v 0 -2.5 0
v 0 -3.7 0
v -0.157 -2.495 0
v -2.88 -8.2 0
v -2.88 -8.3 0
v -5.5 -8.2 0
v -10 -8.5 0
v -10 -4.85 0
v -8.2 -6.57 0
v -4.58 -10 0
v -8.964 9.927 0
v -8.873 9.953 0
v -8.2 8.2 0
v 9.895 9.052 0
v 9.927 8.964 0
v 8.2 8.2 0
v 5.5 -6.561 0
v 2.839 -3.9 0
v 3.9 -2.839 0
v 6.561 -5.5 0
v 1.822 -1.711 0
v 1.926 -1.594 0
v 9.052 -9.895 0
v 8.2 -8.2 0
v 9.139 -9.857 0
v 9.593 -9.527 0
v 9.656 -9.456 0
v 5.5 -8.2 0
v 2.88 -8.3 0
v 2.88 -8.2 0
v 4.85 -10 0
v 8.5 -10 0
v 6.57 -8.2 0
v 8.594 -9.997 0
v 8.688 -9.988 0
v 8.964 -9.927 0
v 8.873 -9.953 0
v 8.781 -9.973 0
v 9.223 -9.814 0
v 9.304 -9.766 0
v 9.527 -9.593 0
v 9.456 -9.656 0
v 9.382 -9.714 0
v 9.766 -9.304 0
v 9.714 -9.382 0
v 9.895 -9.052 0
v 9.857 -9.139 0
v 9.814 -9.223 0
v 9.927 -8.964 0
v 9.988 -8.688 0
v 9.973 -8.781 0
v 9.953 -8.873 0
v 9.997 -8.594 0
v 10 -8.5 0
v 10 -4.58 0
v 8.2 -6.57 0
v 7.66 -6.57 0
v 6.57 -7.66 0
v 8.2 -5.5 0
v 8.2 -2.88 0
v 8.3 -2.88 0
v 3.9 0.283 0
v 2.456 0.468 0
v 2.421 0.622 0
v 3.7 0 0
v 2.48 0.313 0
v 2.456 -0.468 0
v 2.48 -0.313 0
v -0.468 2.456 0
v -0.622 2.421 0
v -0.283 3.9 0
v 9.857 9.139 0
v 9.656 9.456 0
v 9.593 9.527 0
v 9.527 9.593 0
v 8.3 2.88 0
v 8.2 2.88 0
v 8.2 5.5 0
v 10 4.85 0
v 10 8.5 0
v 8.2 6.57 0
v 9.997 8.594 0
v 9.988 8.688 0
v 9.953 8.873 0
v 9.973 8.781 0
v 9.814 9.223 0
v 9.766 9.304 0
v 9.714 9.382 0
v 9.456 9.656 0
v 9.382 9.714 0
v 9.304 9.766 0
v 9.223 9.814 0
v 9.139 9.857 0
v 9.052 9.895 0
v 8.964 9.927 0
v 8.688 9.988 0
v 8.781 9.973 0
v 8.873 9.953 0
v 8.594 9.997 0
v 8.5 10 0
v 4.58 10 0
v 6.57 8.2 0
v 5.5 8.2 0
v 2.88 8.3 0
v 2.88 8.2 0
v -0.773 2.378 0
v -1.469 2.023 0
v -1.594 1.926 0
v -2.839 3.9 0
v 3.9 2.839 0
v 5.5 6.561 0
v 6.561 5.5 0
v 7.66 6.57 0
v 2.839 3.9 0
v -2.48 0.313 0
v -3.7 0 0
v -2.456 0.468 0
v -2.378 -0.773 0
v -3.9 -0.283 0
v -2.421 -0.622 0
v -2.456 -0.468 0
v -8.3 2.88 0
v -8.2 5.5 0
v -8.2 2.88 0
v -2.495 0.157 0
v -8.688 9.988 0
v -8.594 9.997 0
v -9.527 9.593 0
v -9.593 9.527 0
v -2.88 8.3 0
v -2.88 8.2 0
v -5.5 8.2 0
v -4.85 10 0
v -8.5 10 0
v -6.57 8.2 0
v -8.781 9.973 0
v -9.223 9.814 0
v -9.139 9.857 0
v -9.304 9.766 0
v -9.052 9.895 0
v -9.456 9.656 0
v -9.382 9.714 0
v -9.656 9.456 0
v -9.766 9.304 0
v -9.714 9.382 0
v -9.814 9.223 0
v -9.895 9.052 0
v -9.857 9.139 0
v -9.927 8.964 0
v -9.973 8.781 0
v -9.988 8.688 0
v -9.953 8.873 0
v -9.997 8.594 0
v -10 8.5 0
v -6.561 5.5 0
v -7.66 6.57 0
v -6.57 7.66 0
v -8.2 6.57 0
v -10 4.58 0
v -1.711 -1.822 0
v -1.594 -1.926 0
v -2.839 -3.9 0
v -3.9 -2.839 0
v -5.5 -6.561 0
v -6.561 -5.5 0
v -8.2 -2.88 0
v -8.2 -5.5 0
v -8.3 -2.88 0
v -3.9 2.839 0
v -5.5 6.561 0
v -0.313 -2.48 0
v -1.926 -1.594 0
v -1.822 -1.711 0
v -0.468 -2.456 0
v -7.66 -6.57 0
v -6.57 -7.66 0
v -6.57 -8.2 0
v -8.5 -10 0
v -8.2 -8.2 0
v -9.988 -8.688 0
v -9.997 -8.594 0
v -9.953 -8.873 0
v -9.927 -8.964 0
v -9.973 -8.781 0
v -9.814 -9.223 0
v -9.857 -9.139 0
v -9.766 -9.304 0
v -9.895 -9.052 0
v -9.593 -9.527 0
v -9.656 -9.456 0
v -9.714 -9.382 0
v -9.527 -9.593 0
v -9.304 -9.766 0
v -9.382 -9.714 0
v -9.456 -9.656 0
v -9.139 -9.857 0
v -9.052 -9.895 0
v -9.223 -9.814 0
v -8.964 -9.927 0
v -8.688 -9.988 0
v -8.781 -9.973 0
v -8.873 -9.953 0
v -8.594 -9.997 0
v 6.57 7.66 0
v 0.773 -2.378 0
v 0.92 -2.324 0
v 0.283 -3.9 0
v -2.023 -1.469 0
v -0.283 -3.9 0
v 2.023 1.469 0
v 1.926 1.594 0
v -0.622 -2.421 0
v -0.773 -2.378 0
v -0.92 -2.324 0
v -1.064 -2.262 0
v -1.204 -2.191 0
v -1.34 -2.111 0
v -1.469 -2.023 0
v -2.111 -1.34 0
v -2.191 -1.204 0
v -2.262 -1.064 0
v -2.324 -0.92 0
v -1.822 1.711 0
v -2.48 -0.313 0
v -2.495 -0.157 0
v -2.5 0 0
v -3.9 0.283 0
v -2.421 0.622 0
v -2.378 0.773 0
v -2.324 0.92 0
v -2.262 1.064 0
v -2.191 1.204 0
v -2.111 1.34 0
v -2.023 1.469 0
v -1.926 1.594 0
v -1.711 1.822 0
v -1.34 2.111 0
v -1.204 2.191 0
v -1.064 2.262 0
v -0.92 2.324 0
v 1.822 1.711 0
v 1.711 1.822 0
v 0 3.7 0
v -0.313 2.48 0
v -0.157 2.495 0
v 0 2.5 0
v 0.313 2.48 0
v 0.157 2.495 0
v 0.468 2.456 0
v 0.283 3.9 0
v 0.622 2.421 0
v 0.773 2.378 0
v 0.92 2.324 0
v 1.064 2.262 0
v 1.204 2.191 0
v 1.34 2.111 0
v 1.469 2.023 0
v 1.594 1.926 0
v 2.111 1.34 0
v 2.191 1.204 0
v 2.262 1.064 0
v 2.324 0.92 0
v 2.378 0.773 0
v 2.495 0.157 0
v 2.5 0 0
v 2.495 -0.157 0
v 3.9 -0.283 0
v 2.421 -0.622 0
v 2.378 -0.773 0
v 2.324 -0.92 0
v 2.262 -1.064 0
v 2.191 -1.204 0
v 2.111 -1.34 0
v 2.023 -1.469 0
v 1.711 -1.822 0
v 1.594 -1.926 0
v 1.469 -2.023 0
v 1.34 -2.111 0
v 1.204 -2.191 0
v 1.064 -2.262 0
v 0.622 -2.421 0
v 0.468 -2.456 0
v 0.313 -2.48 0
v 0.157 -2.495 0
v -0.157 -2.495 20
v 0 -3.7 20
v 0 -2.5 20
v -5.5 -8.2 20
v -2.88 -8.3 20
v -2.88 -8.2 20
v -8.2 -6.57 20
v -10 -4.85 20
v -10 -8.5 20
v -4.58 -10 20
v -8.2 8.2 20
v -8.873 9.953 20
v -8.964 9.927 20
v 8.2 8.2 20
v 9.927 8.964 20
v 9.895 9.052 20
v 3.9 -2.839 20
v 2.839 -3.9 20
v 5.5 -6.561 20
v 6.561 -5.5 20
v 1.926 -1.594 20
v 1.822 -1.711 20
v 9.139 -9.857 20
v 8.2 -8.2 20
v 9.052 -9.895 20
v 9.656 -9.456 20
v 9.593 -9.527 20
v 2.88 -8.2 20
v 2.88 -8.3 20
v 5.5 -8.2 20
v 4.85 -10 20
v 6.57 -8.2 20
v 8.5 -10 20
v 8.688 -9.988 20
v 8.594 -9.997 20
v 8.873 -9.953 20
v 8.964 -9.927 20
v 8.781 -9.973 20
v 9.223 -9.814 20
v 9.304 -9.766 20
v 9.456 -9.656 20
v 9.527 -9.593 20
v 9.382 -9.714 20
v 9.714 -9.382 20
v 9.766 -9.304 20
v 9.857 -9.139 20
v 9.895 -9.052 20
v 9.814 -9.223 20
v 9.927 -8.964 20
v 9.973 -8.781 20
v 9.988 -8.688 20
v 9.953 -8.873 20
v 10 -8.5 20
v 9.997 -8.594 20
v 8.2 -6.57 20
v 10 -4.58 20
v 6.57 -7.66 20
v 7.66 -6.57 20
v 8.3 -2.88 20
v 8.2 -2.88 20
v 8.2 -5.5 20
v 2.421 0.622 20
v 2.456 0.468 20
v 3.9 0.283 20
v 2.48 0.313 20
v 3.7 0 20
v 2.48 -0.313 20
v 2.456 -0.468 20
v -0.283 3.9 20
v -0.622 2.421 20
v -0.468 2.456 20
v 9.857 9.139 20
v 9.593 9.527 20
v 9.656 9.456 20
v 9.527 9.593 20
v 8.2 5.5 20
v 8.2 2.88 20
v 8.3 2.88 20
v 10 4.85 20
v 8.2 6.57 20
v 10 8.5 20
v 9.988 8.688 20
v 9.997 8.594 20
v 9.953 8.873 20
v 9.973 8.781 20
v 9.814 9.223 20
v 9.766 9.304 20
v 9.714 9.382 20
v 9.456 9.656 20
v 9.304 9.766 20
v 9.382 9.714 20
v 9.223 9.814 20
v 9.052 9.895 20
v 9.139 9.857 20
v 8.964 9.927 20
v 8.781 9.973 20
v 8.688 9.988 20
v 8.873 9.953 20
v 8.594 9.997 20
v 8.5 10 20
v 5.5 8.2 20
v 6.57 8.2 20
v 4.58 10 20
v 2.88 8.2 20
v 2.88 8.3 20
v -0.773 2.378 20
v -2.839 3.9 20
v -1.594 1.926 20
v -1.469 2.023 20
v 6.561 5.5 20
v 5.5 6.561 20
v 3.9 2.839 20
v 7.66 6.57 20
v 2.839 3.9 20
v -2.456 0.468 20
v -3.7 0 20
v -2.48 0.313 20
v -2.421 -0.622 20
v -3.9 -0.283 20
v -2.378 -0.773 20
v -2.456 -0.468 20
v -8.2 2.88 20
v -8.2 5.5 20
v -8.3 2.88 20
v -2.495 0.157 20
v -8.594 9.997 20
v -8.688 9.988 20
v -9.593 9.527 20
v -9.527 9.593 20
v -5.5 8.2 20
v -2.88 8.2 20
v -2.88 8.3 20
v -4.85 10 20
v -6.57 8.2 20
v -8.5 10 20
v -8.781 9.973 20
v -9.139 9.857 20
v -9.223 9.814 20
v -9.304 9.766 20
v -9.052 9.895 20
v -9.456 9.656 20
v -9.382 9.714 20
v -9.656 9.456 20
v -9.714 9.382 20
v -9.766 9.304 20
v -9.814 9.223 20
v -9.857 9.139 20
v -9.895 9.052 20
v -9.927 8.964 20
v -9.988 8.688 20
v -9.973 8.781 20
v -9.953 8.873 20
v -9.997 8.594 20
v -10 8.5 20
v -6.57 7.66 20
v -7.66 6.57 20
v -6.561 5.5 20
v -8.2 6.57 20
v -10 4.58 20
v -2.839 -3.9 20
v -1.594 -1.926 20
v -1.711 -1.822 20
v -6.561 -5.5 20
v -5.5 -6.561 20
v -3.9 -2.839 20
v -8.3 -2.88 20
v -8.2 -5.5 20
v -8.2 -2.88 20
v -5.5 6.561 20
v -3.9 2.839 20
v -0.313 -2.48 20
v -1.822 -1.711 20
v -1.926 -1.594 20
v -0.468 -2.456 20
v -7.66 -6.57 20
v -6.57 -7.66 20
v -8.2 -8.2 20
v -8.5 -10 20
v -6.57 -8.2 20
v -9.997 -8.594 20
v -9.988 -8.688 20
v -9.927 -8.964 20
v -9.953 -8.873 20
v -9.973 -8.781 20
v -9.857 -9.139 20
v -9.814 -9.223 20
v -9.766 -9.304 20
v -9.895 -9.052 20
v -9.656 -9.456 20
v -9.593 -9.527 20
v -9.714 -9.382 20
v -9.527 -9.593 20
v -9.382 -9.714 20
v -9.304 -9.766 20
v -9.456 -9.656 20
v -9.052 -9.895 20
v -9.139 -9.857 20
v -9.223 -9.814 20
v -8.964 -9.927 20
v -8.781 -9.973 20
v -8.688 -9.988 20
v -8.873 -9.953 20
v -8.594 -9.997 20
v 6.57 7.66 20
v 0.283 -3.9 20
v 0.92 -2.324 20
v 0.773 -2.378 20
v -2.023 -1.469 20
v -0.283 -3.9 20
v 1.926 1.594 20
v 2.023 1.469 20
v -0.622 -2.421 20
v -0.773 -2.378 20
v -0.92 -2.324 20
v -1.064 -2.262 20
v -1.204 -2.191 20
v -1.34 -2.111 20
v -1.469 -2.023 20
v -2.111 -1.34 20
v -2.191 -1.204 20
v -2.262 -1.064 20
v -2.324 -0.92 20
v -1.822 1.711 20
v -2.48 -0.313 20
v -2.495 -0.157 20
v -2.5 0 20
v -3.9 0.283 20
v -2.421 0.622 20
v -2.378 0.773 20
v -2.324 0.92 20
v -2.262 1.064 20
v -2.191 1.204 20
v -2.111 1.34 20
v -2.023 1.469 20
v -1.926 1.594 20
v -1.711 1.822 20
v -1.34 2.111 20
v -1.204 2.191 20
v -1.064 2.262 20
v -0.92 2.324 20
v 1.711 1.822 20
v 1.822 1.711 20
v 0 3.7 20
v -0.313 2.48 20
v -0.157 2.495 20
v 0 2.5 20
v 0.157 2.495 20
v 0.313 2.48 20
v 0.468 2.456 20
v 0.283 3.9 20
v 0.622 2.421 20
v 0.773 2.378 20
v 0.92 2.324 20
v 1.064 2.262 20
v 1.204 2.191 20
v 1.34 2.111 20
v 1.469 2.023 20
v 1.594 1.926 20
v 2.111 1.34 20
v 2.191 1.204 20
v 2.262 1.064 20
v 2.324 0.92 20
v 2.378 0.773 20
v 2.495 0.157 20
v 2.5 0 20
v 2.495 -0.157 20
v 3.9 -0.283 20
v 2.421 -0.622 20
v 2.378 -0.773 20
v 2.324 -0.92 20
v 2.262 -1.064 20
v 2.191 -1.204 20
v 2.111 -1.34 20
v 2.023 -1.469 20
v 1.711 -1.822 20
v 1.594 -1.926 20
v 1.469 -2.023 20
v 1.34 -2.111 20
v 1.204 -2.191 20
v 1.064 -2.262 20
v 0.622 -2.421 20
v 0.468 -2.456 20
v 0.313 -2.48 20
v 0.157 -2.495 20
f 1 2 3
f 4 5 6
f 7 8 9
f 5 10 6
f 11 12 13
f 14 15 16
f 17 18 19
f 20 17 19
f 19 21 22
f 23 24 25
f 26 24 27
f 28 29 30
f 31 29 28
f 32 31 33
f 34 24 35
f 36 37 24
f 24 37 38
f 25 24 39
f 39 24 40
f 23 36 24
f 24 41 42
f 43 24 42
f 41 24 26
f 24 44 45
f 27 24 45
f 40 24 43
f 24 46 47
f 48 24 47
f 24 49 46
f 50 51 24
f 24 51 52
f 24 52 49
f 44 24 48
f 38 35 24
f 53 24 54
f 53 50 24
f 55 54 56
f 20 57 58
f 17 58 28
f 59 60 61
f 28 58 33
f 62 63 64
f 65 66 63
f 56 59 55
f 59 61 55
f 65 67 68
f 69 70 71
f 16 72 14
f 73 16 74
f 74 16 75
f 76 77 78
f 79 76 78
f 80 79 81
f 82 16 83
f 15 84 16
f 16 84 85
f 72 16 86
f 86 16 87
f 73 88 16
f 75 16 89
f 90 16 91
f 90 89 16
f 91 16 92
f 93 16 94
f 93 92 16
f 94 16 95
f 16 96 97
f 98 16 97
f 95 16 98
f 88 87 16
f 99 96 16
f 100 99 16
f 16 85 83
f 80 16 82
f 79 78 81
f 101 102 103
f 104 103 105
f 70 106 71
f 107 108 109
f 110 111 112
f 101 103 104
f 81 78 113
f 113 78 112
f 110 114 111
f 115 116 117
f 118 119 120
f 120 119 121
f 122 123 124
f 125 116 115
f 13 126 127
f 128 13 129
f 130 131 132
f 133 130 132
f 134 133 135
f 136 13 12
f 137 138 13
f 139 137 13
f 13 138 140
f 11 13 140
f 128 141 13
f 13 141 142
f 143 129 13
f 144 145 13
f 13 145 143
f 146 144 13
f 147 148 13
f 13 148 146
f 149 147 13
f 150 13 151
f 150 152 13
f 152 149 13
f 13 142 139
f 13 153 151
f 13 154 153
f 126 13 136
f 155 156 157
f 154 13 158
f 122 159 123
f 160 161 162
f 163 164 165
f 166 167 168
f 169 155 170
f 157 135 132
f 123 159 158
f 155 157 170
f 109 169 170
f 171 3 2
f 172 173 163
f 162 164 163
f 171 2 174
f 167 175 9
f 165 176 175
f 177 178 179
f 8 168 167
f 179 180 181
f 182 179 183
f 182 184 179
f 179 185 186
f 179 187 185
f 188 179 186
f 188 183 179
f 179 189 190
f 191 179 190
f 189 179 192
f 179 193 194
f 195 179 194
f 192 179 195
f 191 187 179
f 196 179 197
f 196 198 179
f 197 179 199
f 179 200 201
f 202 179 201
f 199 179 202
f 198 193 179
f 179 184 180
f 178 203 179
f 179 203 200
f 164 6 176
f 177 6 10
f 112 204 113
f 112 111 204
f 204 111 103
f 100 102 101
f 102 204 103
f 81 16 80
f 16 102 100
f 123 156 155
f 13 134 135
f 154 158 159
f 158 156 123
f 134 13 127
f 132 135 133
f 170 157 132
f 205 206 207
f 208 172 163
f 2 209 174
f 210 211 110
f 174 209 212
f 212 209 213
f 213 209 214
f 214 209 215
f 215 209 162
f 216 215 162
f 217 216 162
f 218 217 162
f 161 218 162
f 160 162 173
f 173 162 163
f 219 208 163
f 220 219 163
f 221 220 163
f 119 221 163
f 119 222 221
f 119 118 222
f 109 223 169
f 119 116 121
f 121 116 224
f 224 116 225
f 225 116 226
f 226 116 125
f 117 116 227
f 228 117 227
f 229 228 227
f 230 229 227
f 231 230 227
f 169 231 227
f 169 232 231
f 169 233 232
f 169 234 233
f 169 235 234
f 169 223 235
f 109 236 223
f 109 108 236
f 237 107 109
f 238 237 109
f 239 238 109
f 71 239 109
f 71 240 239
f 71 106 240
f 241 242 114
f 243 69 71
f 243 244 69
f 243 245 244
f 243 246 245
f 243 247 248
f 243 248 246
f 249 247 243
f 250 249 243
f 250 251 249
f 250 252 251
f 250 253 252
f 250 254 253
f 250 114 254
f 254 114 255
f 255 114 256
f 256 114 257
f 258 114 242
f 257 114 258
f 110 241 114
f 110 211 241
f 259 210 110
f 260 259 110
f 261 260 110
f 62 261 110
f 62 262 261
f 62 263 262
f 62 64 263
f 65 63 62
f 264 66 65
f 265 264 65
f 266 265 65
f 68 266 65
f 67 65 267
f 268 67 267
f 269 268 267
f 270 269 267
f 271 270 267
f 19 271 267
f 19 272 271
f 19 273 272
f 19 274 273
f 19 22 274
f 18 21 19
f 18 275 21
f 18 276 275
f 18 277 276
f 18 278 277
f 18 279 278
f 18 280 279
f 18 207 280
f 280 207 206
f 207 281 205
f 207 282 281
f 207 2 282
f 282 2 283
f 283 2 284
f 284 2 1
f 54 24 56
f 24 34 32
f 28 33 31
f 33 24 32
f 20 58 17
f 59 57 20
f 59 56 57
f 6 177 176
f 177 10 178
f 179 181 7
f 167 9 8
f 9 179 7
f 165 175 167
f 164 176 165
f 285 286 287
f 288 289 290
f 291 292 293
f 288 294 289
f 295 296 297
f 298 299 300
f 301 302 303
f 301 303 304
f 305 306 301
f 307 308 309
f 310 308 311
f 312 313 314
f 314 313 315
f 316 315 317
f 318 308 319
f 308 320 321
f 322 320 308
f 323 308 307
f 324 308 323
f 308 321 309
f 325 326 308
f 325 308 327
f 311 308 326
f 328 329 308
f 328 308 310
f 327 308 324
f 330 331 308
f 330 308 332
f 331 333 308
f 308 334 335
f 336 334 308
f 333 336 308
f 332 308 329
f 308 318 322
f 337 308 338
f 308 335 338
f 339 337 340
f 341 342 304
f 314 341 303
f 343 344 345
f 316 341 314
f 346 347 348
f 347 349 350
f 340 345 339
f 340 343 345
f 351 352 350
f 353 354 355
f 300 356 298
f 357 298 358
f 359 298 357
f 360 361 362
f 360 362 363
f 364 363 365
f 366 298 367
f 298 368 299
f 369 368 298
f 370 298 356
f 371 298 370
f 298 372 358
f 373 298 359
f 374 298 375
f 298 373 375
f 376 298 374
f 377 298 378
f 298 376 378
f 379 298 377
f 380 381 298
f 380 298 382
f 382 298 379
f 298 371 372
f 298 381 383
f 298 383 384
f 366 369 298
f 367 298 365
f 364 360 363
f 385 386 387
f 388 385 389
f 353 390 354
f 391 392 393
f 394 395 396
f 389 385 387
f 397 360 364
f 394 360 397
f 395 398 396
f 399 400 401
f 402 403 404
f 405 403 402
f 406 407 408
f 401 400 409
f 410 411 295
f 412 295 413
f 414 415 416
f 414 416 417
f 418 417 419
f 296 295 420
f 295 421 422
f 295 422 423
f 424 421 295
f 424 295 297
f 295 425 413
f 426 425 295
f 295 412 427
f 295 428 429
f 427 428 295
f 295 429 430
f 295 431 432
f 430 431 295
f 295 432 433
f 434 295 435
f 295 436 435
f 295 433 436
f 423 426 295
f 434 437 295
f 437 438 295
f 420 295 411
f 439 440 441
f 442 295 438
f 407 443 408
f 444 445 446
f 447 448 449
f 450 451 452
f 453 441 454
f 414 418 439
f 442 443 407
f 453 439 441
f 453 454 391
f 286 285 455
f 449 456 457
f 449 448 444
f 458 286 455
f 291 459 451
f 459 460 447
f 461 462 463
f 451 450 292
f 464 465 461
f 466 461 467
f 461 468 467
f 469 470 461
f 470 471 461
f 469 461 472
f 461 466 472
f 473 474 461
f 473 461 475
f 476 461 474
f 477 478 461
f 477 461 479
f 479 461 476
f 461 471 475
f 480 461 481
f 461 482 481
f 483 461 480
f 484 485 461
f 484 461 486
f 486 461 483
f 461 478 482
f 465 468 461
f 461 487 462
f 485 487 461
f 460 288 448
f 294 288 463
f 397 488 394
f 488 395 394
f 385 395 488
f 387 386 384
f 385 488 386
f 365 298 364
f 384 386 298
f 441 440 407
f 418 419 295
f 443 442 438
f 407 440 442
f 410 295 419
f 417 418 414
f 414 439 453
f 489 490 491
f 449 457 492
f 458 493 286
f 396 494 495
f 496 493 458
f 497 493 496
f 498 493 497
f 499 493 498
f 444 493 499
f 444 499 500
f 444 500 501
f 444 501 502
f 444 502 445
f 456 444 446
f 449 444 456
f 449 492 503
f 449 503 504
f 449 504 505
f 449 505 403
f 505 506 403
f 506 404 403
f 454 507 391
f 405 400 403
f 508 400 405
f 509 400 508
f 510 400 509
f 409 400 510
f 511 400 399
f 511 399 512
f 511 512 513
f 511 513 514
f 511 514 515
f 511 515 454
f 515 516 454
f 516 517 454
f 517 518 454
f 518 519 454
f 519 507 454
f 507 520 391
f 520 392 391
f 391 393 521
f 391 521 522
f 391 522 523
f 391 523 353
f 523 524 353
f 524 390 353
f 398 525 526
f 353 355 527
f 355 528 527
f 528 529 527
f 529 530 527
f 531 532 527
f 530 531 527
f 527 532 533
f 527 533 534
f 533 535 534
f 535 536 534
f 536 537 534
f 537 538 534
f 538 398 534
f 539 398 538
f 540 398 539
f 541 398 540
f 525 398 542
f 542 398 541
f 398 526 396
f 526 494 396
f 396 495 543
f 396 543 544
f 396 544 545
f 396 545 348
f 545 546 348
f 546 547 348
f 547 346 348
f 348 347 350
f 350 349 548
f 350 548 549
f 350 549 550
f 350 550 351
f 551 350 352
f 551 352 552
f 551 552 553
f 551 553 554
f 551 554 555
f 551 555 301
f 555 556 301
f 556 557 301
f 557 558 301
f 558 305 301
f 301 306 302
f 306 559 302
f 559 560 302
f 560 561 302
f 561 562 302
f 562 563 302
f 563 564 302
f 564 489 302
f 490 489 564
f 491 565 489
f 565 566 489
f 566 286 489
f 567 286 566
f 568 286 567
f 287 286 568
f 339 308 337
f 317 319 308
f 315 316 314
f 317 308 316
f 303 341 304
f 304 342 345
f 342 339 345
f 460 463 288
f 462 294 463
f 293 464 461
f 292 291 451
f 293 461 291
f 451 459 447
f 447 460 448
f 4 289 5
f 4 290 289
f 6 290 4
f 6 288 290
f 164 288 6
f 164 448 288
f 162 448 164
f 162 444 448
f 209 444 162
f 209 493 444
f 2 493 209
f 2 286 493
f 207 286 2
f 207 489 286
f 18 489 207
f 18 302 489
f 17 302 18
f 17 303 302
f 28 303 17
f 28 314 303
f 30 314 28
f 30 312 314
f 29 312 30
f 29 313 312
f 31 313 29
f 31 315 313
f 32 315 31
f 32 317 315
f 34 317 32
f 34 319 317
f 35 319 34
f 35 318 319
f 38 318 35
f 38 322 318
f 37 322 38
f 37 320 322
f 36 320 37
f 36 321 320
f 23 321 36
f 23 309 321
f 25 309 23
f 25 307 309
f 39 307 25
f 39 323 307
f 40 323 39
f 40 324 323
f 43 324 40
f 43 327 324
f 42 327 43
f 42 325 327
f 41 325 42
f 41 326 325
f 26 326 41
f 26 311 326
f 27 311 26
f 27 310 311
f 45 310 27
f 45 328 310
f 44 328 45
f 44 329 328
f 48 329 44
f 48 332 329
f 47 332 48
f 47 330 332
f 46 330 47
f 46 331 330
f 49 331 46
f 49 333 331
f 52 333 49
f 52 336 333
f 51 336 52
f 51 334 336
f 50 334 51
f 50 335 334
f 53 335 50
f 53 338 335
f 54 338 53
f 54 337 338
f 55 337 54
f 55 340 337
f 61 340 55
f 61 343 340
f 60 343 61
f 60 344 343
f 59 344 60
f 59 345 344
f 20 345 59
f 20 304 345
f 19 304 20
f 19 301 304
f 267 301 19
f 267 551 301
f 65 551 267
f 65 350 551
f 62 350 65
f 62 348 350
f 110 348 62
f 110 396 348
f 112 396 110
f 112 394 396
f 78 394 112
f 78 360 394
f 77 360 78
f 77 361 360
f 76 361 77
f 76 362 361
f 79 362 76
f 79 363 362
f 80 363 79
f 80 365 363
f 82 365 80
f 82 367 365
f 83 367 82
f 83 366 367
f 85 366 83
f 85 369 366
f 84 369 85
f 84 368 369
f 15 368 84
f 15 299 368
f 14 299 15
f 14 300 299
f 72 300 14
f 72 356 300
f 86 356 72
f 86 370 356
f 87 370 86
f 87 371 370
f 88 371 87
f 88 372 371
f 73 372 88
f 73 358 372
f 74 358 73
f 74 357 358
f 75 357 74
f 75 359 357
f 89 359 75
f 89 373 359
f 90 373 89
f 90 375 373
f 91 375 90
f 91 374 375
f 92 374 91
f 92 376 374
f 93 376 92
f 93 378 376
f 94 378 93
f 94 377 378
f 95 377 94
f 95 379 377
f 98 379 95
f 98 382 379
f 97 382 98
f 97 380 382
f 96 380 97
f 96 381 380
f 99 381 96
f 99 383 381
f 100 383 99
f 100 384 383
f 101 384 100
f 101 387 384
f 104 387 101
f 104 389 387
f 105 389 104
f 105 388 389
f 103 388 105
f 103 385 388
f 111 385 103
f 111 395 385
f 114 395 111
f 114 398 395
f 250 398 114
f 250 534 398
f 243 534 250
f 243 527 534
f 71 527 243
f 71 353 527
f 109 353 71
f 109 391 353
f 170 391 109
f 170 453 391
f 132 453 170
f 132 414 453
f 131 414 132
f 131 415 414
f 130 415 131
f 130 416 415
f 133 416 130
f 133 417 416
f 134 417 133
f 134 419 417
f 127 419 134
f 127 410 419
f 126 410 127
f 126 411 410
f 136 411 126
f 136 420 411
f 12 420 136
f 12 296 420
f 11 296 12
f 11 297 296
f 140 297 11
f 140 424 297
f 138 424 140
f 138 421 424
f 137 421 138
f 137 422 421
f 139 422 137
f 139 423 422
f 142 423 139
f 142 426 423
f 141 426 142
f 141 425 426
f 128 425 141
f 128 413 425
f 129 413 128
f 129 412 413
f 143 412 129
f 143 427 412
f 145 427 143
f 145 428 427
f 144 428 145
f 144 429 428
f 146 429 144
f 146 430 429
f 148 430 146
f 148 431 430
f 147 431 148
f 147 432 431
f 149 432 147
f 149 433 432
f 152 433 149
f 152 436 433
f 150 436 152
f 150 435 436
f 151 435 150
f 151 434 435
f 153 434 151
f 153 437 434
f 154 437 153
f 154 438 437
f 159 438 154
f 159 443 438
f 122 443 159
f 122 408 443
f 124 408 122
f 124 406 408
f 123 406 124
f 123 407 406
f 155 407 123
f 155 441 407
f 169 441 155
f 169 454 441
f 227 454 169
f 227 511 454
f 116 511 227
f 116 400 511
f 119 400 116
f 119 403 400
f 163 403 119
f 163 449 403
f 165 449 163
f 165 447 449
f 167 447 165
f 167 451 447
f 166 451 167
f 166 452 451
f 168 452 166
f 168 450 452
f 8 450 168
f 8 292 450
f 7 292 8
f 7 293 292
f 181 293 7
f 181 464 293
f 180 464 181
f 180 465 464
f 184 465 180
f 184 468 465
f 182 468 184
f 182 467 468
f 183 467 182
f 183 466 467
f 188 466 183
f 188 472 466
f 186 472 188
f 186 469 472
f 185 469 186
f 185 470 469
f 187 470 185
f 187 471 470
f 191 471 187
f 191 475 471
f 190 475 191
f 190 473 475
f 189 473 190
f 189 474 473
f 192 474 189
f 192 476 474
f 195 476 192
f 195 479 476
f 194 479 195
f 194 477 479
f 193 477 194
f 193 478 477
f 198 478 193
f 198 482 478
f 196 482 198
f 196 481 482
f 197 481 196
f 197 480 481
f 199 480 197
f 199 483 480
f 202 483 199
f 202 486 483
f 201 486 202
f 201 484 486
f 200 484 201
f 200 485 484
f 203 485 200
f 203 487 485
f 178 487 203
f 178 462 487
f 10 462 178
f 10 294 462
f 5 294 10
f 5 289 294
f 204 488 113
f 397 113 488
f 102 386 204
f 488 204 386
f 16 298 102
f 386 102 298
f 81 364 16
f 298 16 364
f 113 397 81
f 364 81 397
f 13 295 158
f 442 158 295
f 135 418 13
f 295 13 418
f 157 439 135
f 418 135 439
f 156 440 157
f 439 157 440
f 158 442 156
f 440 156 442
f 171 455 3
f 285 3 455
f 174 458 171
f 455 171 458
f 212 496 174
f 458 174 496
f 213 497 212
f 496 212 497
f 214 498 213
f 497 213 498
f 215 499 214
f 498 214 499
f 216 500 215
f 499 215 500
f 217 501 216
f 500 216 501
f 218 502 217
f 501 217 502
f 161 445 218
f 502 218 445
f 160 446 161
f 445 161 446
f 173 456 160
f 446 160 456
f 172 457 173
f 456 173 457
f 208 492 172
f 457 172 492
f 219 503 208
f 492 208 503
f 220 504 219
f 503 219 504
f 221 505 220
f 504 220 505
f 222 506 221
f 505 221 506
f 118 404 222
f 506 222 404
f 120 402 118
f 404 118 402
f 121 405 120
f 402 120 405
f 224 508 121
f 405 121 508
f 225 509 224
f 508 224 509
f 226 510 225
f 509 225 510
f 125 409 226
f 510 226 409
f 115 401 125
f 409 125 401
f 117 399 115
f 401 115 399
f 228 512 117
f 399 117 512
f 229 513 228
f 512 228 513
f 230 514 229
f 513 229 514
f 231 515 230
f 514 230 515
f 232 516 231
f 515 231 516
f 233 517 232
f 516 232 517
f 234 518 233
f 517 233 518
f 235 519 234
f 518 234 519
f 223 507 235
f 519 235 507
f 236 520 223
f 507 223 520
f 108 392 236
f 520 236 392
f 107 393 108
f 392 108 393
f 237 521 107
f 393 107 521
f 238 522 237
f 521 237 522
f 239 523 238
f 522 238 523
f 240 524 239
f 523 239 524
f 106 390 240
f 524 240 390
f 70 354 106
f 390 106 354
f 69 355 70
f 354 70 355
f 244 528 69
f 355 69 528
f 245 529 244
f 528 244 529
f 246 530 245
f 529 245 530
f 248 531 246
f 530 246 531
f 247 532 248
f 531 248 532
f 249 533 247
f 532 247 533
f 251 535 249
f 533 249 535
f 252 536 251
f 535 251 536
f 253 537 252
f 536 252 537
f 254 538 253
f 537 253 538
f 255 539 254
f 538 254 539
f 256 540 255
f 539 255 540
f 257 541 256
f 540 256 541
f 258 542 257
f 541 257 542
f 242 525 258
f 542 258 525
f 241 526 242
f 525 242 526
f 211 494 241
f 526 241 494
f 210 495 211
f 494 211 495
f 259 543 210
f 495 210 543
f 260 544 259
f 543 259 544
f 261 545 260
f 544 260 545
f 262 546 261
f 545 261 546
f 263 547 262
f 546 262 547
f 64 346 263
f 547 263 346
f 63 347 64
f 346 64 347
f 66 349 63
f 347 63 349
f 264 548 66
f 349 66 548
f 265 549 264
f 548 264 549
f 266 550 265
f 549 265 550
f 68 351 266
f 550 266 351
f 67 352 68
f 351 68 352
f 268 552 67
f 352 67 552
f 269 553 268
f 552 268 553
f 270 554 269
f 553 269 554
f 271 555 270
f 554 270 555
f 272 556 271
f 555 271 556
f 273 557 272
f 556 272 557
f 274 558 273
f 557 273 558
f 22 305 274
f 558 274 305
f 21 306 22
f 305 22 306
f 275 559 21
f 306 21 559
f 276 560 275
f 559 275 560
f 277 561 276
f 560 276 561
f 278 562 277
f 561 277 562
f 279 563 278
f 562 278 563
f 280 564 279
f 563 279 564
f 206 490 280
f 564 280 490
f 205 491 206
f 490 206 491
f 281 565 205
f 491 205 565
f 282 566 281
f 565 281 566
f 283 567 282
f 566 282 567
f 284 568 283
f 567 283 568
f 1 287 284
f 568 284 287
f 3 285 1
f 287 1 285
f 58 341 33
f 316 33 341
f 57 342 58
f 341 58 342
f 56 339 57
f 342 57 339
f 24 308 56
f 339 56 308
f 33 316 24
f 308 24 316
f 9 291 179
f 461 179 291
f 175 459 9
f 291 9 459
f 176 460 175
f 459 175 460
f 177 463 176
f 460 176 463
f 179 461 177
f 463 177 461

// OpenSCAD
part = "20x Extrusion"; //[20x Extrusion, 40x40 Extrusion, Wheel, OpenRail, 20mm Gantry Plate, Universal Gantry Plate, OpenRail Gantry Plate, 20x End Cap, T-Nut, Flat Linker, Angled Linker] 

type = "20mm"; //[20mm, 40mm, 60mm, 80mm]

scale_factor = 1; //[1:Full, 0.5:Half, 0.25:Quarter]

length = 20; //[10:1:100]

sections = 2; //[2:1:24]

angle = 90; //[10:1:180]

hole_offset = 0; //[0:1:100]

/*[Hidden]*/
$fn=100;
delta=0.01;
tolerance = 0.2;

//radius to edge
function apothem(s=20, n) = s/(2*tan(180/n));
//radius to corner
function circumradius(s=20, n) = s/(2*sin(180/n));
//polar to cartesian
function p2c_x(r,a) = r*cos(a);
function p2c_y(r,a) = r*sin(a);

module oval_hole(){
    translate([-length/2,-diameter/2,0])
    cube([length,diameter,height]);
    
    translate([length/2,0,0])
    cylinder(h=height, d=diameter);
    
    translate([-length/2,0,0])
    cylinder(h=height, d=diameter);    
}

//Basic outline of one quarter of extrusion
module vslot_unit(){
    difference(){
        union(){
            polygon(points=[[0,0],[0,3.7],[0.2*sqrt(2),3.9],[3.9-1.5*sqrt(0.5),3.9],[5.5,5.5+1.5*sqrt(0.5)],[5.5,8.2],[2.88,8.2],[2.88,8.3],[4.58,10],[8.5,10],[8.5,8.5],[10,8.5],[10,4.85],[8.3,2.88],[8.2,2.88],[8.2,5.5],[5.5+1.5*sqrt(0.5),5.5],[3.9,3.9-1.5*sqrt(0.5)],[3.9,0.2*sqrt(2)],[3.7,0]]);
            
            translate([8.5,8.5,0])
            circle(d=3);
        }
        
        union(){
            circle(d=5);
            
            polygon(points=[[6.57,8.2],[8.2,8.2],[8.2,6.57],[7.66,6.57],[6.57,7.66]]);
        }
    }
}

module vslot_corner(){
    difference(){
        union(){
            polygon(points=[[0,0],[0,3.7],[0.2*sqrt(2),3.9],[2.4,3.9],[3.9,2.4],[3.9,0.2*sqrt(2)],[3.7,0]]);
            
            translate([2.4,2.4,0])
            circle(d=3);
        }
        
        circle(d=5);
    }
}

//Basic outline used in the middle of anything larger than 20x20
module vslot_extension_unit(){
    difference(){
        union(){
            polygon(points=[[0,0],[0,3.7],[0.2*sqrt(2),3.9],[3.9-1.5*sqrt(0.5),3.9],[5.5,5.5+1.5*sqrt(0.5)],[5.5,8.2],[2.78,8.2],[4.58,10],[10,10],[10,8.2],[7.3,8.2],[7.3,7.3-1.5*sqrt(0.5)],[3.9,3.9-1.5*sqrt(0.5)],[3.9,0.2*sqrt(2)],[3.7,0]]);
        }
        
        union(){
            circle(d=5);
        }
    }
}

//Pieces together the extention units
module vslot_extension_part(){
    translate([-20,0,0])
    vslot_extension_unit();
    
    translate([-20,0,0])
    mirror([0,1,0])
    vslot_extension_unit();
    
    rotate([0,0,180])
    vslot_extension_unit();
    
    mirror([0,1,0])
    rotate([0,0,180])
    vslot_extension_unit();
}

//Pieces together the extrusion
module extrusion(sections, offset_r){
    linear_extrude(height=length)
    offset(r=offset_r)
    union(){
        for(i=[0:1])
            rotate([0,0,-i*90])
            vslot_unit();
        
        translate([-20*(sections),0,0])
        for(i=[2:3])
            rotate([0,0,-i*90])
            vslot_unit();
        
        if(type != "20mm")
            for(i=[0:sections-1])
                translate([-20*i,0,0])
                vslot_extension_part();
    }
}

module 40x40(){
    linear_extrude(height=length)
    union(){
        for(i=[0:3])
        rotate([0,0,i*90])
        translate([10,10,0])
        union(){
            vslot_unit();

            rotate([0,0,-90])
            vslot_extension_unit();

            rotate([0,180,0])
            vslot_extension_unit();

            rotate([0,0,180])
            vslot_corner();
        }
    }
}

module wheel(){
    rotate_extrude()
    //Wheel cross section
    polygon(points=[[6.94717,-0.5],[7.98715,-0.5],[7.98715,-4.816523],[8.28715,-5.116523],[9.774828,-5.116523],[11.945,-2.946351],[11.945,-2.44542],[10.049828,-0.275],[9.374828,-0.275],[9.374828,0.275],[10.049828,0.275],[11.945,2.44542],[11.945,2.946351],[9.774828,5.116523],[8.28715,5.116523],[7.98715,4.816523],[7.98715,0.5],[6.94717,0.5]]);
}

module openrail(){
    difference(){
        linear_extrude(height=length)
        union(){
            //OpenRail cross section
            polygon(points=[[0,0.3],[0.3,0.3],[0.3,0],[2.075,0],[2.075,0.3],[2.375,0.3],[2.375,19.529],[4.75,19.529],[4.75,20.329],[2.375+0.5*sqrt(0.5),22.704-0.5*sqrt(0.5)],[2.375,22.704-0.5*sqrt(2)],[2.375-0.5*sqrt(0.5),22.704-0.5*sqrt(0.5)],[0,20.329]]);
            
            translate([0.3,0.3,0])
            circle(d=0.6);
            
            translate([2.075,0.3,0])
            circle(d=0.6);
            
            translate([2.375,22.704-0.5*sqrt(2),0])
            circle(d=1);
        }
        
        for(i=[0:floor(length/50)])
            translate([-delta,9.7543,50*(i+0.5)])
            rotate([0,90,0])
            rotate([0,0,-90])
            oval_hole(length=6.7, diameter=5.3, height=2.375+2*delta);
    }
}

plate_spec = [
["width","Depth","Thickness","Corner Radius",
    ["Hole Diameter","Hole Length (0 for circle)","X translation","Y translation"]
],

//20mm Gantry Plate
[65.5,65.5,3,3.36,
    [3,6.5,-20.146,27.7],[3,6.5,0,27.7],[3,6.5,20.146,27.7],
    [5,0,-19.85,20],[5,20.64,0,20],[7.2,0,19.85,20],
    [5,0,-19.85,10],[5,0,0,10],[5,0,19.85,10],
    [5,0,-19.85,0],[5,0,-10,0],[5,0,0,0],[5,0,10,0],[7.2,0,19.85,0],
    [5,0,-19.85,-10],[5,0,0,-10],[5,0,19.85,-10],
    [5,0,-19.85,-20],[5,20.64,0,-20],[7.2,0,19.85,-20],
    [3,6.5,-20.146,-27.7],[3,6.5,0,-27.7],[3,6.5,20.146,-27.7]
],

//Universal Gantry Plate
[127,88,3,3.36,
    [3,6.5,-20,38.02],[3,6.5,0,38.02],[3,6.5,20,38.02],
    [5,0,-49.85,30.32],[5,0,-39.85,30.32],[5,0,-29.85,30.32],[5,0,-19.85,30.32],[5,20,0,30.32],[7.2,0,19.85,30.32],[7.2,0,29.85,30.32],[7.2,0,39.85,30.32],[7.2,0,49.85,30.32],
    [5,0,-49.85,20.325],[5,0,-39.85,20.325],[5,0,-29.85,20.325],[5,0,-19.85,20.325],[5,0,-10,20.325],[5,0,0,20.325],[5,0,10,20.325],[5,0,19.85,20.325],[5,0,29.85,20.325],[5,0,39.85,20.325],[5,0,49.85,20.325],
    [5,0,-14.825,14.82],[5,0,14.825,14.82],
    [5,0,-29.85,10],[5,0,-19.85,10],[5,0,0,10],[5,0,19.85,10],[5,0,29.85,10],
    [5,0,-49.85,0],[5,0,-39.85,0],[5,0,-29.85,0],[5,0,-19.85,0],[5,0,-10,0],[5,0,0,0],[5,0,10,0],[7.2,0,19.85,0],[7.2,0,29.85,0],[7.2,0,39.85,0],[7.2,0,49.85,0],
    [5,0,-29.85,-10],[5,0,-19.85,-10],[5,0,0,-10],[5,0,19.85,-10],[5,0,29.85,-10],
    [5,0,-14.825,-14.82],[5,0,14.825,-14.82],
    [5,0,-49.85,-20.325],[5,0,-39.85,-20.325],[5,0,-29.85,-20.325],[5,0,-19.85,-20.325],[5,0,-10,-20.325],[5,0,0,-20.325],[5,0,10,-20.325],[5,0,19.85,-20.325],[5,0,29.85,-20.325],[5,0,39.85,-20.325],[5,0,49.85,-20.325],
    [5,0,-49.85,-30.32],[5,0,-39.85,-30.32],[5,0,-29.85,-30.32],[5,0,-19.85,-30.32],[5,20,0,-30.32],[7.2,0,19.85,-30.32],[7.2,0,29.85,-30.32],[7.2,0,39.85,-30.32],[7.2,0,49.85,-30.32],
    [3,6.5,-20,-38.02],[3,6.5,0,-38.02],[3,6.5,20,-38.02]
],

//OpenRail 20mm Gantry Plate
[80,80,3.175,10,
    [5,0,-22.3,22.3],[5,0,0,22.3],[7.137,0,22.3,22.3],
    [5,0,0,22.30],
    [5,0,0,10],
    [5,0,-22.3,0],[5,0,-10,0],[5,0,0,0],[5,0,10,0],[7.137,0,22.3,0],
    [5,0,0,-10],
    [5,0,-22.3,-22.3],[5,0,0,-22.3],[7.137,0,22.3,-22.3]
],

//OpenRail 40mm Gantry Plate
[100,120,3.175,10,
    [5,0,-32.3,42.3],[5,0,-22.3,42.3],[5,0,-10,42.3],[5,0,0,42.3],[5,0,10,42.3],[7.137,0,22.3,42.3],[7.137,0,32.3,42.3],
    [5,0,-10,30],[5,0,10,30],
    [5,0,-10,20],[5,0,10,20],
    [5,0,-40,10],[5,0,-20,10],[5,0,0,10],[5,0,20,10],[5,0,40,10],
    [5,0,-32.3,0],[5,0,-10,0],[5,0,0,0],[5,0,10,0],[7.137,0,32.3,0],
    [5,0,-40,-10],[5,0,-20,-10],[5,0,0,-10],[5,0,20,-10],[5,0,40,-10],
    [5,0,-10,-20],[5,0,10,-20],
    [5,0,-10,-30],[5,0,10,-30],
    [5,0,-32.3,-42.3],[5,0,-22.3,-42.3],[5,0,-10,-42.3],[5,0,0,-42.3],[5,0,10,-42.3],[7.137,0,22.3,-42.3],[7.137,0,32.3,-42.3]
],

//OpenRail 60mm Gantry Plate
[120,140,3.175,10,
    [5,0,-42.3,52.3],[5,0,-32.3,52.3],[5,0,-22.3,52.3],[5,0,-10,52.3],[5,0,0,52.3],[5,0,10,52.3],[7.137,0,22.3,52.3],[7.137,0,32.3,52.3],[7.137,0,42.3,52.3],
    [5,0,-20,30],[5,0,0,30],[5,0,20,30],
    [5,0,-42.3,26.3],[7.137,0,42.3,26.3],
    [5,0,-30,20],[5,0,0,20],[5,0,30,20],
    [5,0,-45,10],[5,0,0,10],[5,0,45,10],
    [5,0,-42.30,0],[5,0,-30,0],[5,0,-20,0],[5,0,-10,0],[5,0,0,0],[5,0,10,0],[5,0,20,0],[5,0,30,0],[7.137,0,42.30,0],
    [5,0,-45,-10],[5,0,0,-10],[5,0,45,-10],
    [5,0,-30,-20],[5,0,0,-20],[5,0,30,-20],
    [5,0,-42.3,-26.3],[7.137,0,42.3,-26.3],
    [5,0,-20,-30],[5,0,0,-30],[5,0,20,-30],
    [5,0,-42.3,-52.3],[5,0,-32.3,-52.3],[5,0,-22.3,-52.3],[5,0,-10,-52.3],[5,0,0,-52.3],[5,0,10,-52.3],[7.137,0,22.3,-52.3],[7.137,0,32.3,-52.3],[7.137,0,42.3,-52.3]
],

//OpenRail 80mm Gantry Plate
[140,160,3.175,10,
    [5,0,-52.3,62.3],[5,0,-42.3,62.3],[5,0,-32.3,62.3],[5,0,-22.3,62.3],[5,0,-10,62.3],[5,0,0,62.3],[5,0,10,62.3],[7.137,0,22.3,62.3],[7.137,0,32.3,62.3],[7.137,0,42.3,62.3],[7.137,0,52.3,62.3],
    [5,0,-30,40],[5,0,-20,40],[5,0,20,40],[5,0,30,40],
    [5,0,-52.3,35],[7.137,0,52.3,35],
    [5,0,-40,30],[5,0,0,30],[5,0,40,30],
    [5,0,-55,10],[5,0,-40,10],[5,0,0,10],[5,0,40,10],[5,0,55,10],
    [5,0,-52.3,0],[5,0,-30,0],[5,0,-10,0],[5,0,0,0],[5,0,10,0],[5,0,30,0],[5,0,52.3,0],
    [5,0,-55,-10],[5,0,-40,-10],[5,0,0,-10],[5,0,40,-10],[5,0,55,-10],
    [5,0,-40,-30],[5,0,0,-30],[5,0,40,-30],
    [5,0,-52.3,-35],[7.137,0,52.3,-35],
    [5,0,-30,-40],[5,0,-20,-40],[5,0,20,-40],[5,0,30,-40],
    [5,0,-52.3,-62.3],[5,0,-42.3,-62.3],[5,0,-32.3,-62.3],[5,0,-22.3,-62.3],[5,0,-10,-62.3],[5,0,0,-62.3],[5,0,10,-62.3],[7.137,0,22.3,-62.3],[7.137,0,32.3,-62.3],[7.137,0,42.3,-62.3],[7.137,0,52.3,-62.3]
]
];

module plate (plate_type){
    difference(){
        //The plate
        translate([-(plate_spec[plate_type][0]-plate_spec[plate_type][3])/2,-(plate_spec[plate_type][1]-plate_spec[plate_type][3])/2,0])
        minkowski(){
            cube([plate_spec[plate_type][0]-plate_spec[plate_type][3],plate_spec[plate_type][1]-plate_spec[plate_type][3],plate_spec[plate_type][2]/2]);
            cylinder(h=plate_spec[plate_type][2]/2, d=plate_spec[plate_type][3]);
        }
        
        //The holes
        for (i=[4:len(plate_spec[plate_type])-1]){
            translate([plate_spec[plate_type][i][2],plate_spec[plate_type][i][3],-delta])
            oval_hole(height=plate_spec[plate_type][2]+2*delta,diameter=plate_spec[plate_type][i][0],length=plate_spec[plate_type][i][1]);
        }
    }
}

module end_cap(sections, offset_r){
    difference(){
        translate([-8.5-20*sections,-8.5,-2])
        minkowski(){
            cube([17+20*sections,17,6]);
            cylinder(h=6, d=3);
        }
        
        union(){
            extrusion(sections, offset_r);
            
            for(i=[-1:2:1])
                translate([8.2,8.2*i,0])
                cylinder(h=15, d=3.4);
            
            for(i=[-1:2:1])
                translate([-8.2-20*sections,8.2*i,0])
                cylinder(h=15, d=3.4);
        }
    }
}

module t_nut(){
    difference(){
        linear_extrude(height=length)
        //2.5*tolerance allows T-Nut to move freely, reduce ratio for tighter fit
        offset(r=-2.5*tolerance)
        polygon(points=[[3.9-1.5*sqrt(0.5),3.9],[5.5,5.5+1.5*sqrt(0.5)],[5.5,8.2],[-5.5,8.2],[-5.5,5.5+1.5*sqrt(0.5)],[-3.9+1.5*sqrt(0.5),3.9]]);
        
        translate([0,3.9+tolerance-delta,length/2])
        rotate([0,30,0])
        rotate([-90,0,0])
        union(){
            // h = depth of nut hole
            // (d*sqrt(3)/2 = nut size, flat-to-flat
            cylinder(h=2.5, d=(2*5.5)/sqrt(3), $fn=6);
            
            // d = diameter of hole for bolt thread
            cylinder(h=4.3-2*tolerance+2*delta, d=2.5);
        }
    }
}

module linker_blank(){
    translate([0,0,-3.9-2.5*tolerance])
    rotate([90,0,0])
    difference(){
        linear_extrude(height=length)
        //2.5*tolerance allows T-Nut to move freely, reduce ratio for tighter fit
        offset(r=-2.5*tolerance)
        polygon(points=[[3.9-1.5*sqrt(0.5),3.9],[5.5,5.5+1.5*sqrt(0.5)],[5.5,8.2],[-5.5,8.2],[-5.5,5.5+1.5*sqrt(0.5)],[-3.9+1.5*sqrt(0.5),3.9]]);
        
        for(i=[-floor(length/20):2:floor(length/20)])
        translate([0,3.9+tolerance-delta,5*i+length/2])
        rotate([0,30,0])
        rotate([-90,0,0])
        union(){
            // h = depth of nut hole
            // (d*sqrt(3)/2 = nut size, flat-to-flat
            cylinder(h=2.5, d=(2*5.5)/sqrt(3), $fn=6);
            
            // d = diameter of hole for bolt thread
            cylinder(h=4.3-2*tolerance+2*delta, d=2.5);
        }
    }
}

module flat_linker(){
    //total angle
    a=(sections-1)*angle;
    //interior of half triangle
    b=90-a/2;
    //y from origin
    B=apothem(s=20,n=360/angle);
    //x from origin
    A=(B*sin(a/2))/sin(b);
    //cord
    cord=2*circumradius(s=20,n=360/angle);

    difference(){
        union(){
            for(i=[0:sections-1])
            rotate([0,0,i*angle])
            translate([0,-apothem(n=360/angle),0])
            linker_blank();

            rotate(-angle/2)
            linear_extrude(height=4.3-(5*tolerance))
            rotate([180,0,0])
            polygon(points=
            [for (i = [0 : sections]) 
            [circumradius(n=360/angle)*sin(i*angle),
            circumradius(n=360/angle)*cos(i*angle)]
            ]);

            intersection(){
                translate([A,-apothem(s=20,n=360/angle),0])
                cylinder(r=A+10, h=4.3-(5*tolerance));

                translate([-10,-B,0])
                rotate(a/2)
                cube([cord,cord,4.3-(5*tolerance)]);
            }
        }
        union(){            
            rotate([0,0,a/2-90])
            translate([hole_offset,0,-delta])
            cylinder(d=2.5, h=4.3-(5*tolerance)+2*delta);
        }
    }
}

module angled_linker(){
    translate([0,0,-4.3+(5*tolerance)+2*delta])
    linker_blank();

    rotate([180-angle,0,0])
    translate([0,length,-4.3+(5*tolerance)+2*delta])
    linker_blank();

    translate([-5.5+(2.5*tolerance),0,0])
    rotate([0,90,0])
    rotate_extrude(angle=180-angle)
    translate([8.6-(4.5*tolerance),5.5-(2.5*tolerance),0])
    rotate([0,0,90])
    offset(r=-2.5*tolerance)
    polygon(points=[[3.9-1.5*sqrt(0.5),3.9],[5.5,5.5+1.5*sqrt(0.5)],[5.5,8.2],[-5.5,8.2],[-5.5,5.5+1.5*sqrt(0.5)],[-3.9+1.5*sqrt(0.5),3.9]]);
}

module show_what(){
    if(part == "20x Extrusion"){
        if(type == "20mm")
            extrusion(sections=0, offset_r=0);
        if(type == "40mm")
            extrusion(sections=1, offset_r=0);
        if(type == "60mm")
            extrusion(sections=2, offset_r=0);
        if(type == "80mm")
            extrusion(sections=3, offset_r=0);
    }
    if(part == "40x40 Extrusion")
        40x40();
    if(part == "Wheel")
        wheel();
    if(part == "OpenRail")
        openrail();
    if(part == "20mm Gantry Plate")
        plate(plate_type=1);
    if(part == "Universal Gantry Plate")
        plate(plate_type=2);
    if(part == "OpenRail Gantry Plate"){
        if(type == "20mm")
            plate(plate_type=3);
        if(type == "40mm")
            plate(plate_type=4);
        if(type == "60mm")
            plate(plate_type=5);
        if(type == "80mm")
            plate(plate_type=6);
    }
    if(part == "20x End Cap"){
        if(type == "20mm")
            end_cap(sections=0, offset_r=tolerance);
        if(type == "40mm")
            end_cap(sections=1, offset_r=tolerance);
        if(type == "60mm")
            end_cap(sections=2, offset_r=tolerance);
        if(type == "80mm")
            end_cap(sections=3, offset_r=tolerance);
    }
    if(part == "T-Nut")
        t_nut();
    if (part == "Flat Linker")
        flat_linker();
    if (part == "Angled Linker")
        angled_linker();
}

color("silver")
scale(scale_factor)
show_what();
